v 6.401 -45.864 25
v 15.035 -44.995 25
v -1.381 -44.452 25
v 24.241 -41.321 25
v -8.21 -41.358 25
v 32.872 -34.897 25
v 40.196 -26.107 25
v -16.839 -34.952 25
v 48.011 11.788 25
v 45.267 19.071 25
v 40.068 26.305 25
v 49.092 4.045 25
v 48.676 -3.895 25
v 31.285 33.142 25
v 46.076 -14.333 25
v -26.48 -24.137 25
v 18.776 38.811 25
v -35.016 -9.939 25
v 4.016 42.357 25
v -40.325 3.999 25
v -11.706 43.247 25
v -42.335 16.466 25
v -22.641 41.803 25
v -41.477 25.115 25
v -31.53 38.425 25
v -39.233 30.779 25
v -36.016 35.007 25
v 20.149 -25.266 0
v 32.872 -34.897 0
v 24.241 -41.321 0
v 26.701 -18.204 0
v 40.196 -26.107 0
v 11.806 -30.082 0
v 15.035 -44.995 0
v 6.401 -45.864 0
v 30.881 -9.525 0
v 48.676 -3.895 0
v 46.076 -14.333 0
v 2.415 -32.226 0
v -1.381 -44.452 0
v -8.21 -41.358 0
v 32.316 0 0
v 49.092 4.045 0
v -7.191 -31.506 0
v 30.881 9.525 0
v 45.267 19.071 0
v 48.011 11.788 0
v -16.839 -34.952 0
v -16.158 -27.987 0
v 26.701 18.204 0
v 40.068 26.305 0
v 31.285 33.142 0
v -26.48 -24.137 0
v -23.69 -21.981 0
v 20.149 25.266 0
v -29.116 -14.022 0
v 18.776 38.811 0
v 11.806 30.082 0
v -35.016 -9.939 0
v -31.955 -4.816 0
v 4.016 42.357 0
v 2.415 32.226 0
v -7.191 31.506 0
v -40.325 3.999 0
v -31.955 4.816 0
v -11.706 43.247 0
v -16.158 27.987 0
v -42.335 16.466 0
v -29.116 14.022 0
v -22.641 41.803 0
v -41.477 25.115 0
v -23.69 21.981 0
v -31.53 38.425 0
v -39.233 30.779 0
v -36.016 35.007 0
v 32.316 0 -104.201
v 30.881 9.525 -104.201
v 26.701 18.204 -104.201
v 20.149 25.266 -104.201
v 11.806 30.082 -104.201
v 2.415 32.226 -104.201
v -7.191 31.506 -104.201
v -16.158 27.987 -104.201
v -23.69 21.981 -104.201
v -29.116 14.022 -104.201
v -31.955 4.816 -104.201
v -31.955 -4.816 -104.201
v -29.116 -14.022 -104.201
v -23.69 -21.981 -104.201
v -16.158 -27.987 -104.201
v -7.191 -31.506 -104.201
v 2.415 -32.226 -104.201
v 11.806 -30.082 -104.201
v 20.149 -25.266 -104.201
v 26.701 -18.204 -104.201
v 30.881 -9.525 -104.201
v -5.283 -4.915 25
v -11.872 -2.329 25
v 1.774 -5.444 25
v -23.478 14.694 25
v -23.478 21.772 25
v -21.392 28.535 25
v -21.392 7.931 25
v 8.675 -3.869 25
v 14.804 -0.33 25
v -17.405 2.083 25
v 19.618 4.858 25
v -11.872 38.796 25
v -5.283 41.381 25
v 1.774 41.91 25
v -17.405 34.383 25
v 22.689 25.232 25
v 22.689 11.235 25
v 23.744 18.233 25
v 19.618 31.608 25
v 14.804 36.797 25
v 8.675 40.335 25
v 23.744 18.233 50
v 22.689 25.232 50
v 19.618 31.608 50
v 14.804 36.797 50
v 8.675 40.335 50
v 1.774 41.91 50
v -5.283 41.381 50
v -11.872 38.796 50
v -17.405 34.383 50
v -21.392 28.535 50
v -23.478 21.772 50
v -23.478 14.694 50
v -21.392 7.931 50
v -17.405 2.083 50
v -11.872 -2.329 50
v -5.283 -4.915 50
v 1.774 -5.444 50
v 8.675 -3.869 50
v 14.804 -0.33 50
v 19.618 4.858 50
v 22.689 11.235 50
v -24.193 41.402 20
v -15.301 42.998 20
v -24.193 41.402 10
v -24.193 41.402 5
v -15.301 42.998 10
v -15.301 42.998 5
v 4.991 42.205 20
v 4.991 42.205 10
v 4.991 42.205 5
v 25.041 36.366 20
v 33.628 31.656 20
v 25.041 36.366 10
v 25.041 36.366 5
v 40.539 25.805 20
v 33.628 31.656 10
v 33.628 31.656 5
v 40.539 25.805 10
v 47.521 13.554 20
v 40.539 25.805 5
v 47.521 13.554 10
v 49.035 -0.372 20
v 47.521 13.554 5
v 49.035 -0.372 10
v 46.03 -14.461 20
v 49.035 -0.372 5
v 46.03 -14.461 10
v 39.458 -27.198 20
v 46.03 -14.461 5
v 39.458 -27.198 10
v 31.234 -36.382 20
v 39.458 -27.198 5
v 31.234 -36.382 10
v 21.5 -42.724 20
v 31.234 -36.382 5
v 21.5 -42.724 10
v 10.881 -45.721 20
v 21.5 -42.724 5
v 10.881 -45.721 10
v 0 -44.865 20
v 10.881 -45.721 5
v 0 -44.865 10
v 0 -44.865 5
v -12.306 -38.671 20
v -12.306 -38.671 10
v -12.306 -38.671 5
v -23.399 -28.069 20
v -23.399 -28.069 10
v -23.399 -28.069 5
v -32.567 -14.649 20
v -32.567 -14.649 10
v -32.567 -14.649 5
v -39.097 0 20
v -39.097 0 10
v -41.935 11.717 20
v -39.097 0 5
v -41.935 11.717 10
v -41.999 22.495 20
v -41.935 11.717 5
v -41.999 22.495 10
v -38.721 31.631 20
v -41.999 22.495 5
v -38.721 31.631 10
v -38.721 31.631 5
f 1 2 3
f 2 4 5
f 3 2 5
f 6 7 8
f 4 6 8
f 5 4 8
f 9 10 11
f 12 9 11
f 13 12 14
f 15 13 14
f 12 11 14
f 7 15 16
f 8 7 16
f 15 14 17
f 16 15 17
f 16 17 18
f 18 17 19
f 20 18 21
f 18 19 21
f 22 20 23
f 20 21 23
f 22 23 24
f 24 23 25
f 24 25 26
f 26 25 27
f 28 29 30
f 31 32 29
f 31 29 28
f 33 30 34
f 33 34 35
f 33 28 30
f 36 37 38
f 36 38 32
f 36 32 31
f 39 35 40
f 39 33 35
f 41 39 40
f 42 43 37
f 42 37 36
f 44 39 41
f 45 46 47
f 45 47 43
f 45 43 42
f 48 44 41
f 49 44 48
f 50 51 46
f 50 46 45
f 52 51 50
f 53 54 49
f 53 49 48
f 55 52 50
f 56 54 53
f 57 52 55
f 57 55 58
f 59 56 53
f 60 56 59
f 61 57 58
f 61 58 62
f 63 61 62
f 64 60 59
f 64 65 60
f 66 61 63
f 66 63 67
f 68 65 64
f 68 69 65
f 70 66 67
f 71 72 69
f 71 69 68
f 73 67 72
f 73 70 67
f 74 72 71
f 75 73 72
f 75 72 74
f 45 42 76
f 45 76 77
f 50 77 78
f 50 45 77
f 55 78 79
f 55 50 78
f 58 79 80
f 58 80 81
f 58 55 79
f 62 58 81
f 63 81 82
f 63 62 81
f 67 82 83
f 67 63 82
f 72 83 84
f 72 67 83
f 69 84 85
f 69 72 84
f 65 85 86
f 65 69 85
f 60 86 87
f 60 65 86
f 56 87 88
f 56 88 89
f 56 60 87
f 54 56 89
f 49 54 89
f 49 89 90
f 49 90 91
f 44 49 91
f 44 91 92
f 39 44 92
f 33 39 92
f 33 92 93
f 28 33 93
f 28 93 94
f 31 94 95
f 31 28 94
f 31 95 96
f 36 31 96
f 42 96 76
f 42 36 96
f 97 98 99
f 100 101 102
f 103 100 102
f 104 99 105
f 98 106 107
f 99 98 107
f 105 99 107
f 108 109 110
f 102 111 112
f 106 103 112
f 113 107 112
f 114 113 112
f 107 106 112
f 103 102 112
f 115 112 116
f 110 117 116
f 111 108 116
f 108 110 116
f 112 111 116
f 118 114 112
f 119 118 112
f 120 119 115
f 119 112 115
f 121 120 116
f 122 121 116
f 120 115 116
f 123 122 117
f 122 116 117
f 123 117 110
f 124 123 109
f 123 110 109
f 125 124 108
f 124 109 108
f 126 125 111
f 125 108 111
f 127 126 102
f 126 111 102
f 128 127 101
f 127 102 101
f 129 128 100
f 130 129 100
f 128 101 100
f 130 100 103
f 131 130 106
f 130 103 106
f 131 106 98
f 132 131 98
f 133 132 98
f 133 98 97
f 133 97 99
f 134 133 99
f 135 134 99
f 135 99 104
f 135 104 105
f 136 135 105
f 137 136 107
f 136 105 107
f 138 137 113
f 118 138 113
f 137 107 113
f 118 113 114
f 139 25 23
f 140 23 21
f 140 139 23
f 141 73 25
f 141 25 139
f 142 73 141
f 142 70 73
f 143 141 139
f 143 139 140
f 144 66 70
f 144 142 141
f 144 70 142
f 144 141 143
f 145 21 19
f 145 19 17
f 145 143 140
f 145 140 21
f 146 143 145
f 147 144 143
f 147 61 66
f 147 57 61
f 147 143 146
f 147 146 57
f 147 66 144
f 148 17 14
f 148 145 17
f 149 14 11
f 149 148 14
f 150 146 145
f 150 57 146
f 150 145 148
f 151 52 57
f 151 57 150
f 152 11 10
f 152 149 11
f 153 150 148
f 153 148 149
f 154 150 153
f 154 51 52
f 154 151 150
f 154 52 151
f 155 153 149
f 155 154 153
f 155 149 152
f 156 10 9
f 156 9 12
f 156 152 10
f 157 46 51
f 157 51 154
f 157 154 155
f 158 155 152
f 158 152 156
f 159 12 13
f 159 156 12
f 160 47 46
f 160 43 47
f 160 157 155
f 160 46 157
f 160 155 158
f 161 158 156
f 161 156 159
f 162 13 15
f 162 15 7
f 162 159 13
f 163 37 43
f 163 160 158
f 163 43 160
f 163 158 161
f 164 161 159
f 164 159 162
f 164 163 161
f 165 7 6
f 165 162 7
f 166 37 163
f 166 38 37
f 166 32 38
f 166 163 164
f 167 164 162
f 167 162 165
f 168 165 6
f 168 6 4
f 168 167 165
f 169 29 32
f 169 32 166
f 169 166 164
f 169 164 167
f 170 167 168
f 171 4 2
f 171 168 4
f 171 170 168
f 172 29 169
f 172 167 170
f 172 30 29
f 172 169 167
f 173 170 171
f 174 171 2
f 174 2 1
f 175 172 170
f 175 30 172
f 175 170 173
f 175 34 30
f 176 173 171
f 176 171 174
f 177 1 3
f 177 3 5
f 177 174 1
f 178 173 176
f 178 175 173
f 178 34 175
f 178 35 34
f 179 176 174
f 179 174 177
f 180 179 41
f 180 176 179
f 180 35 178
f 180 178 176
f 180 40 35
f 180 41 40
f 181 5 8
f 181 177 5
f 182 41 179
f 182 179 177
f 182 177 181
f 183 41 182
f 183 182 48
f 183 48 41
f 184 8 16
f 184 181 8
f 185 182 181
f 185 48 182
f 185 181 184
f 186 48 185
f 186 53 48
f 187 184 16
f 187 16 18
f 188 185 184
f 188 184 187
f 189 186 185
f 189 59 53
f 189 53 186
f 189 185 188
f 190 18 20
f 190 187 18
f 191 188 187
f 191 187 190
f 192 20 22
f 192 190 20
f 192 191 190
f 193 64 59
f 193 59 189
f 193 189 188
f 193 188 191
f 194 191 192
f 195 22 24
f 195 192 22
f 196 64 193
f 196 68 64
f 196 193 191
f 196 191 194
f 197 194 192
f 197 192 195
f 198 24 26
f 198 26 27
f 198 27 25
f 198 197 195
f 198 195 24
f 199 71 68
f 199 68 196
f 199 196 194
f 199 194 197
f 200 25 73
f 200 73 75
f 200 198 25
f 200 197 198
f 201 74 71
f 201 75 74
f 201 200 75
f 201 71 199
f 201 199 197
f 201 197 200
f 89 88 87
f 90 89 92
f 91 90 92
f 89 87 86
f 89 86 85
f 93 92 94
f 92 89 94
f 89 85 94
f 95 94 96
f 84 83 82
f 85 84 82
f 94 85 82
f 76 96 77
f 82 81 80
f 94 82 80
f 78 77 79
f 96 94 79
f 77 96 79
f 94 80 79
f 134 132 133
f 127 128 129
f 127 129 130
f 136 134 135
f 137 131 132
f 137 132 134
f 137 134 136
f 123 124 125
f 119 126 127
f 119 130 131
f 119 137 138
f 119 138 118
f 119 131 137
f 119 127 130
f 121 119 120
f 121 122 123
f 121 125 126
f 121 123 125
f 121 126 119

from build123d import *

# Parameters (mm, degrees)
F1_DEPTH = 25
F2_R     = 23.7436163123
F3_DEPTH = 25
F4_R     = 32.3163135732
F5_DEPTH = 104.2014211416


with BuildPart() as f1:
    # F0 (on Top) → F1 (new body)
    with BuildSketch(Plane.XY):
        with BuildLine():
            add(Edge.make_bspline(
                [(-31.5300449729, 38.4246408939), (-14.5154483453, 48.2438142241), (58.3085299853, 38.3369845792), (46.8008862793, -32.6025966669), (-3.6325200242, -57.8144427513), (-45.0924706036, -2.9290200915), (-43.9782145032, 31.2407659578), (-31.5300449729, 38.4246408939)],
                knots=[0, 0, 0, 0, 0.2351060923, 0.4352329658, 0.6159572426, 0.8279923669, 1, 1, 1, 1], degree=3))
        make_face()
    extrude(amount=F1_DEPTH)

    # F4 (on Top) → F5 (join)
    with BuildSketch(Plane.XY):
        Circle(F4_R)
    extrude(amount=-F5_DEPTH)


with BuildPart() as f3:
    # F2 (on face) → F3 (new body)
    with BuildSketch(Plane.XY.offset(25)):
        with Locations((0, 18.2331651449)):
            Circle(F2_R)
    extrude(amount=F3_DEPTH)


solid = Compound([f1.part, f3.part])
